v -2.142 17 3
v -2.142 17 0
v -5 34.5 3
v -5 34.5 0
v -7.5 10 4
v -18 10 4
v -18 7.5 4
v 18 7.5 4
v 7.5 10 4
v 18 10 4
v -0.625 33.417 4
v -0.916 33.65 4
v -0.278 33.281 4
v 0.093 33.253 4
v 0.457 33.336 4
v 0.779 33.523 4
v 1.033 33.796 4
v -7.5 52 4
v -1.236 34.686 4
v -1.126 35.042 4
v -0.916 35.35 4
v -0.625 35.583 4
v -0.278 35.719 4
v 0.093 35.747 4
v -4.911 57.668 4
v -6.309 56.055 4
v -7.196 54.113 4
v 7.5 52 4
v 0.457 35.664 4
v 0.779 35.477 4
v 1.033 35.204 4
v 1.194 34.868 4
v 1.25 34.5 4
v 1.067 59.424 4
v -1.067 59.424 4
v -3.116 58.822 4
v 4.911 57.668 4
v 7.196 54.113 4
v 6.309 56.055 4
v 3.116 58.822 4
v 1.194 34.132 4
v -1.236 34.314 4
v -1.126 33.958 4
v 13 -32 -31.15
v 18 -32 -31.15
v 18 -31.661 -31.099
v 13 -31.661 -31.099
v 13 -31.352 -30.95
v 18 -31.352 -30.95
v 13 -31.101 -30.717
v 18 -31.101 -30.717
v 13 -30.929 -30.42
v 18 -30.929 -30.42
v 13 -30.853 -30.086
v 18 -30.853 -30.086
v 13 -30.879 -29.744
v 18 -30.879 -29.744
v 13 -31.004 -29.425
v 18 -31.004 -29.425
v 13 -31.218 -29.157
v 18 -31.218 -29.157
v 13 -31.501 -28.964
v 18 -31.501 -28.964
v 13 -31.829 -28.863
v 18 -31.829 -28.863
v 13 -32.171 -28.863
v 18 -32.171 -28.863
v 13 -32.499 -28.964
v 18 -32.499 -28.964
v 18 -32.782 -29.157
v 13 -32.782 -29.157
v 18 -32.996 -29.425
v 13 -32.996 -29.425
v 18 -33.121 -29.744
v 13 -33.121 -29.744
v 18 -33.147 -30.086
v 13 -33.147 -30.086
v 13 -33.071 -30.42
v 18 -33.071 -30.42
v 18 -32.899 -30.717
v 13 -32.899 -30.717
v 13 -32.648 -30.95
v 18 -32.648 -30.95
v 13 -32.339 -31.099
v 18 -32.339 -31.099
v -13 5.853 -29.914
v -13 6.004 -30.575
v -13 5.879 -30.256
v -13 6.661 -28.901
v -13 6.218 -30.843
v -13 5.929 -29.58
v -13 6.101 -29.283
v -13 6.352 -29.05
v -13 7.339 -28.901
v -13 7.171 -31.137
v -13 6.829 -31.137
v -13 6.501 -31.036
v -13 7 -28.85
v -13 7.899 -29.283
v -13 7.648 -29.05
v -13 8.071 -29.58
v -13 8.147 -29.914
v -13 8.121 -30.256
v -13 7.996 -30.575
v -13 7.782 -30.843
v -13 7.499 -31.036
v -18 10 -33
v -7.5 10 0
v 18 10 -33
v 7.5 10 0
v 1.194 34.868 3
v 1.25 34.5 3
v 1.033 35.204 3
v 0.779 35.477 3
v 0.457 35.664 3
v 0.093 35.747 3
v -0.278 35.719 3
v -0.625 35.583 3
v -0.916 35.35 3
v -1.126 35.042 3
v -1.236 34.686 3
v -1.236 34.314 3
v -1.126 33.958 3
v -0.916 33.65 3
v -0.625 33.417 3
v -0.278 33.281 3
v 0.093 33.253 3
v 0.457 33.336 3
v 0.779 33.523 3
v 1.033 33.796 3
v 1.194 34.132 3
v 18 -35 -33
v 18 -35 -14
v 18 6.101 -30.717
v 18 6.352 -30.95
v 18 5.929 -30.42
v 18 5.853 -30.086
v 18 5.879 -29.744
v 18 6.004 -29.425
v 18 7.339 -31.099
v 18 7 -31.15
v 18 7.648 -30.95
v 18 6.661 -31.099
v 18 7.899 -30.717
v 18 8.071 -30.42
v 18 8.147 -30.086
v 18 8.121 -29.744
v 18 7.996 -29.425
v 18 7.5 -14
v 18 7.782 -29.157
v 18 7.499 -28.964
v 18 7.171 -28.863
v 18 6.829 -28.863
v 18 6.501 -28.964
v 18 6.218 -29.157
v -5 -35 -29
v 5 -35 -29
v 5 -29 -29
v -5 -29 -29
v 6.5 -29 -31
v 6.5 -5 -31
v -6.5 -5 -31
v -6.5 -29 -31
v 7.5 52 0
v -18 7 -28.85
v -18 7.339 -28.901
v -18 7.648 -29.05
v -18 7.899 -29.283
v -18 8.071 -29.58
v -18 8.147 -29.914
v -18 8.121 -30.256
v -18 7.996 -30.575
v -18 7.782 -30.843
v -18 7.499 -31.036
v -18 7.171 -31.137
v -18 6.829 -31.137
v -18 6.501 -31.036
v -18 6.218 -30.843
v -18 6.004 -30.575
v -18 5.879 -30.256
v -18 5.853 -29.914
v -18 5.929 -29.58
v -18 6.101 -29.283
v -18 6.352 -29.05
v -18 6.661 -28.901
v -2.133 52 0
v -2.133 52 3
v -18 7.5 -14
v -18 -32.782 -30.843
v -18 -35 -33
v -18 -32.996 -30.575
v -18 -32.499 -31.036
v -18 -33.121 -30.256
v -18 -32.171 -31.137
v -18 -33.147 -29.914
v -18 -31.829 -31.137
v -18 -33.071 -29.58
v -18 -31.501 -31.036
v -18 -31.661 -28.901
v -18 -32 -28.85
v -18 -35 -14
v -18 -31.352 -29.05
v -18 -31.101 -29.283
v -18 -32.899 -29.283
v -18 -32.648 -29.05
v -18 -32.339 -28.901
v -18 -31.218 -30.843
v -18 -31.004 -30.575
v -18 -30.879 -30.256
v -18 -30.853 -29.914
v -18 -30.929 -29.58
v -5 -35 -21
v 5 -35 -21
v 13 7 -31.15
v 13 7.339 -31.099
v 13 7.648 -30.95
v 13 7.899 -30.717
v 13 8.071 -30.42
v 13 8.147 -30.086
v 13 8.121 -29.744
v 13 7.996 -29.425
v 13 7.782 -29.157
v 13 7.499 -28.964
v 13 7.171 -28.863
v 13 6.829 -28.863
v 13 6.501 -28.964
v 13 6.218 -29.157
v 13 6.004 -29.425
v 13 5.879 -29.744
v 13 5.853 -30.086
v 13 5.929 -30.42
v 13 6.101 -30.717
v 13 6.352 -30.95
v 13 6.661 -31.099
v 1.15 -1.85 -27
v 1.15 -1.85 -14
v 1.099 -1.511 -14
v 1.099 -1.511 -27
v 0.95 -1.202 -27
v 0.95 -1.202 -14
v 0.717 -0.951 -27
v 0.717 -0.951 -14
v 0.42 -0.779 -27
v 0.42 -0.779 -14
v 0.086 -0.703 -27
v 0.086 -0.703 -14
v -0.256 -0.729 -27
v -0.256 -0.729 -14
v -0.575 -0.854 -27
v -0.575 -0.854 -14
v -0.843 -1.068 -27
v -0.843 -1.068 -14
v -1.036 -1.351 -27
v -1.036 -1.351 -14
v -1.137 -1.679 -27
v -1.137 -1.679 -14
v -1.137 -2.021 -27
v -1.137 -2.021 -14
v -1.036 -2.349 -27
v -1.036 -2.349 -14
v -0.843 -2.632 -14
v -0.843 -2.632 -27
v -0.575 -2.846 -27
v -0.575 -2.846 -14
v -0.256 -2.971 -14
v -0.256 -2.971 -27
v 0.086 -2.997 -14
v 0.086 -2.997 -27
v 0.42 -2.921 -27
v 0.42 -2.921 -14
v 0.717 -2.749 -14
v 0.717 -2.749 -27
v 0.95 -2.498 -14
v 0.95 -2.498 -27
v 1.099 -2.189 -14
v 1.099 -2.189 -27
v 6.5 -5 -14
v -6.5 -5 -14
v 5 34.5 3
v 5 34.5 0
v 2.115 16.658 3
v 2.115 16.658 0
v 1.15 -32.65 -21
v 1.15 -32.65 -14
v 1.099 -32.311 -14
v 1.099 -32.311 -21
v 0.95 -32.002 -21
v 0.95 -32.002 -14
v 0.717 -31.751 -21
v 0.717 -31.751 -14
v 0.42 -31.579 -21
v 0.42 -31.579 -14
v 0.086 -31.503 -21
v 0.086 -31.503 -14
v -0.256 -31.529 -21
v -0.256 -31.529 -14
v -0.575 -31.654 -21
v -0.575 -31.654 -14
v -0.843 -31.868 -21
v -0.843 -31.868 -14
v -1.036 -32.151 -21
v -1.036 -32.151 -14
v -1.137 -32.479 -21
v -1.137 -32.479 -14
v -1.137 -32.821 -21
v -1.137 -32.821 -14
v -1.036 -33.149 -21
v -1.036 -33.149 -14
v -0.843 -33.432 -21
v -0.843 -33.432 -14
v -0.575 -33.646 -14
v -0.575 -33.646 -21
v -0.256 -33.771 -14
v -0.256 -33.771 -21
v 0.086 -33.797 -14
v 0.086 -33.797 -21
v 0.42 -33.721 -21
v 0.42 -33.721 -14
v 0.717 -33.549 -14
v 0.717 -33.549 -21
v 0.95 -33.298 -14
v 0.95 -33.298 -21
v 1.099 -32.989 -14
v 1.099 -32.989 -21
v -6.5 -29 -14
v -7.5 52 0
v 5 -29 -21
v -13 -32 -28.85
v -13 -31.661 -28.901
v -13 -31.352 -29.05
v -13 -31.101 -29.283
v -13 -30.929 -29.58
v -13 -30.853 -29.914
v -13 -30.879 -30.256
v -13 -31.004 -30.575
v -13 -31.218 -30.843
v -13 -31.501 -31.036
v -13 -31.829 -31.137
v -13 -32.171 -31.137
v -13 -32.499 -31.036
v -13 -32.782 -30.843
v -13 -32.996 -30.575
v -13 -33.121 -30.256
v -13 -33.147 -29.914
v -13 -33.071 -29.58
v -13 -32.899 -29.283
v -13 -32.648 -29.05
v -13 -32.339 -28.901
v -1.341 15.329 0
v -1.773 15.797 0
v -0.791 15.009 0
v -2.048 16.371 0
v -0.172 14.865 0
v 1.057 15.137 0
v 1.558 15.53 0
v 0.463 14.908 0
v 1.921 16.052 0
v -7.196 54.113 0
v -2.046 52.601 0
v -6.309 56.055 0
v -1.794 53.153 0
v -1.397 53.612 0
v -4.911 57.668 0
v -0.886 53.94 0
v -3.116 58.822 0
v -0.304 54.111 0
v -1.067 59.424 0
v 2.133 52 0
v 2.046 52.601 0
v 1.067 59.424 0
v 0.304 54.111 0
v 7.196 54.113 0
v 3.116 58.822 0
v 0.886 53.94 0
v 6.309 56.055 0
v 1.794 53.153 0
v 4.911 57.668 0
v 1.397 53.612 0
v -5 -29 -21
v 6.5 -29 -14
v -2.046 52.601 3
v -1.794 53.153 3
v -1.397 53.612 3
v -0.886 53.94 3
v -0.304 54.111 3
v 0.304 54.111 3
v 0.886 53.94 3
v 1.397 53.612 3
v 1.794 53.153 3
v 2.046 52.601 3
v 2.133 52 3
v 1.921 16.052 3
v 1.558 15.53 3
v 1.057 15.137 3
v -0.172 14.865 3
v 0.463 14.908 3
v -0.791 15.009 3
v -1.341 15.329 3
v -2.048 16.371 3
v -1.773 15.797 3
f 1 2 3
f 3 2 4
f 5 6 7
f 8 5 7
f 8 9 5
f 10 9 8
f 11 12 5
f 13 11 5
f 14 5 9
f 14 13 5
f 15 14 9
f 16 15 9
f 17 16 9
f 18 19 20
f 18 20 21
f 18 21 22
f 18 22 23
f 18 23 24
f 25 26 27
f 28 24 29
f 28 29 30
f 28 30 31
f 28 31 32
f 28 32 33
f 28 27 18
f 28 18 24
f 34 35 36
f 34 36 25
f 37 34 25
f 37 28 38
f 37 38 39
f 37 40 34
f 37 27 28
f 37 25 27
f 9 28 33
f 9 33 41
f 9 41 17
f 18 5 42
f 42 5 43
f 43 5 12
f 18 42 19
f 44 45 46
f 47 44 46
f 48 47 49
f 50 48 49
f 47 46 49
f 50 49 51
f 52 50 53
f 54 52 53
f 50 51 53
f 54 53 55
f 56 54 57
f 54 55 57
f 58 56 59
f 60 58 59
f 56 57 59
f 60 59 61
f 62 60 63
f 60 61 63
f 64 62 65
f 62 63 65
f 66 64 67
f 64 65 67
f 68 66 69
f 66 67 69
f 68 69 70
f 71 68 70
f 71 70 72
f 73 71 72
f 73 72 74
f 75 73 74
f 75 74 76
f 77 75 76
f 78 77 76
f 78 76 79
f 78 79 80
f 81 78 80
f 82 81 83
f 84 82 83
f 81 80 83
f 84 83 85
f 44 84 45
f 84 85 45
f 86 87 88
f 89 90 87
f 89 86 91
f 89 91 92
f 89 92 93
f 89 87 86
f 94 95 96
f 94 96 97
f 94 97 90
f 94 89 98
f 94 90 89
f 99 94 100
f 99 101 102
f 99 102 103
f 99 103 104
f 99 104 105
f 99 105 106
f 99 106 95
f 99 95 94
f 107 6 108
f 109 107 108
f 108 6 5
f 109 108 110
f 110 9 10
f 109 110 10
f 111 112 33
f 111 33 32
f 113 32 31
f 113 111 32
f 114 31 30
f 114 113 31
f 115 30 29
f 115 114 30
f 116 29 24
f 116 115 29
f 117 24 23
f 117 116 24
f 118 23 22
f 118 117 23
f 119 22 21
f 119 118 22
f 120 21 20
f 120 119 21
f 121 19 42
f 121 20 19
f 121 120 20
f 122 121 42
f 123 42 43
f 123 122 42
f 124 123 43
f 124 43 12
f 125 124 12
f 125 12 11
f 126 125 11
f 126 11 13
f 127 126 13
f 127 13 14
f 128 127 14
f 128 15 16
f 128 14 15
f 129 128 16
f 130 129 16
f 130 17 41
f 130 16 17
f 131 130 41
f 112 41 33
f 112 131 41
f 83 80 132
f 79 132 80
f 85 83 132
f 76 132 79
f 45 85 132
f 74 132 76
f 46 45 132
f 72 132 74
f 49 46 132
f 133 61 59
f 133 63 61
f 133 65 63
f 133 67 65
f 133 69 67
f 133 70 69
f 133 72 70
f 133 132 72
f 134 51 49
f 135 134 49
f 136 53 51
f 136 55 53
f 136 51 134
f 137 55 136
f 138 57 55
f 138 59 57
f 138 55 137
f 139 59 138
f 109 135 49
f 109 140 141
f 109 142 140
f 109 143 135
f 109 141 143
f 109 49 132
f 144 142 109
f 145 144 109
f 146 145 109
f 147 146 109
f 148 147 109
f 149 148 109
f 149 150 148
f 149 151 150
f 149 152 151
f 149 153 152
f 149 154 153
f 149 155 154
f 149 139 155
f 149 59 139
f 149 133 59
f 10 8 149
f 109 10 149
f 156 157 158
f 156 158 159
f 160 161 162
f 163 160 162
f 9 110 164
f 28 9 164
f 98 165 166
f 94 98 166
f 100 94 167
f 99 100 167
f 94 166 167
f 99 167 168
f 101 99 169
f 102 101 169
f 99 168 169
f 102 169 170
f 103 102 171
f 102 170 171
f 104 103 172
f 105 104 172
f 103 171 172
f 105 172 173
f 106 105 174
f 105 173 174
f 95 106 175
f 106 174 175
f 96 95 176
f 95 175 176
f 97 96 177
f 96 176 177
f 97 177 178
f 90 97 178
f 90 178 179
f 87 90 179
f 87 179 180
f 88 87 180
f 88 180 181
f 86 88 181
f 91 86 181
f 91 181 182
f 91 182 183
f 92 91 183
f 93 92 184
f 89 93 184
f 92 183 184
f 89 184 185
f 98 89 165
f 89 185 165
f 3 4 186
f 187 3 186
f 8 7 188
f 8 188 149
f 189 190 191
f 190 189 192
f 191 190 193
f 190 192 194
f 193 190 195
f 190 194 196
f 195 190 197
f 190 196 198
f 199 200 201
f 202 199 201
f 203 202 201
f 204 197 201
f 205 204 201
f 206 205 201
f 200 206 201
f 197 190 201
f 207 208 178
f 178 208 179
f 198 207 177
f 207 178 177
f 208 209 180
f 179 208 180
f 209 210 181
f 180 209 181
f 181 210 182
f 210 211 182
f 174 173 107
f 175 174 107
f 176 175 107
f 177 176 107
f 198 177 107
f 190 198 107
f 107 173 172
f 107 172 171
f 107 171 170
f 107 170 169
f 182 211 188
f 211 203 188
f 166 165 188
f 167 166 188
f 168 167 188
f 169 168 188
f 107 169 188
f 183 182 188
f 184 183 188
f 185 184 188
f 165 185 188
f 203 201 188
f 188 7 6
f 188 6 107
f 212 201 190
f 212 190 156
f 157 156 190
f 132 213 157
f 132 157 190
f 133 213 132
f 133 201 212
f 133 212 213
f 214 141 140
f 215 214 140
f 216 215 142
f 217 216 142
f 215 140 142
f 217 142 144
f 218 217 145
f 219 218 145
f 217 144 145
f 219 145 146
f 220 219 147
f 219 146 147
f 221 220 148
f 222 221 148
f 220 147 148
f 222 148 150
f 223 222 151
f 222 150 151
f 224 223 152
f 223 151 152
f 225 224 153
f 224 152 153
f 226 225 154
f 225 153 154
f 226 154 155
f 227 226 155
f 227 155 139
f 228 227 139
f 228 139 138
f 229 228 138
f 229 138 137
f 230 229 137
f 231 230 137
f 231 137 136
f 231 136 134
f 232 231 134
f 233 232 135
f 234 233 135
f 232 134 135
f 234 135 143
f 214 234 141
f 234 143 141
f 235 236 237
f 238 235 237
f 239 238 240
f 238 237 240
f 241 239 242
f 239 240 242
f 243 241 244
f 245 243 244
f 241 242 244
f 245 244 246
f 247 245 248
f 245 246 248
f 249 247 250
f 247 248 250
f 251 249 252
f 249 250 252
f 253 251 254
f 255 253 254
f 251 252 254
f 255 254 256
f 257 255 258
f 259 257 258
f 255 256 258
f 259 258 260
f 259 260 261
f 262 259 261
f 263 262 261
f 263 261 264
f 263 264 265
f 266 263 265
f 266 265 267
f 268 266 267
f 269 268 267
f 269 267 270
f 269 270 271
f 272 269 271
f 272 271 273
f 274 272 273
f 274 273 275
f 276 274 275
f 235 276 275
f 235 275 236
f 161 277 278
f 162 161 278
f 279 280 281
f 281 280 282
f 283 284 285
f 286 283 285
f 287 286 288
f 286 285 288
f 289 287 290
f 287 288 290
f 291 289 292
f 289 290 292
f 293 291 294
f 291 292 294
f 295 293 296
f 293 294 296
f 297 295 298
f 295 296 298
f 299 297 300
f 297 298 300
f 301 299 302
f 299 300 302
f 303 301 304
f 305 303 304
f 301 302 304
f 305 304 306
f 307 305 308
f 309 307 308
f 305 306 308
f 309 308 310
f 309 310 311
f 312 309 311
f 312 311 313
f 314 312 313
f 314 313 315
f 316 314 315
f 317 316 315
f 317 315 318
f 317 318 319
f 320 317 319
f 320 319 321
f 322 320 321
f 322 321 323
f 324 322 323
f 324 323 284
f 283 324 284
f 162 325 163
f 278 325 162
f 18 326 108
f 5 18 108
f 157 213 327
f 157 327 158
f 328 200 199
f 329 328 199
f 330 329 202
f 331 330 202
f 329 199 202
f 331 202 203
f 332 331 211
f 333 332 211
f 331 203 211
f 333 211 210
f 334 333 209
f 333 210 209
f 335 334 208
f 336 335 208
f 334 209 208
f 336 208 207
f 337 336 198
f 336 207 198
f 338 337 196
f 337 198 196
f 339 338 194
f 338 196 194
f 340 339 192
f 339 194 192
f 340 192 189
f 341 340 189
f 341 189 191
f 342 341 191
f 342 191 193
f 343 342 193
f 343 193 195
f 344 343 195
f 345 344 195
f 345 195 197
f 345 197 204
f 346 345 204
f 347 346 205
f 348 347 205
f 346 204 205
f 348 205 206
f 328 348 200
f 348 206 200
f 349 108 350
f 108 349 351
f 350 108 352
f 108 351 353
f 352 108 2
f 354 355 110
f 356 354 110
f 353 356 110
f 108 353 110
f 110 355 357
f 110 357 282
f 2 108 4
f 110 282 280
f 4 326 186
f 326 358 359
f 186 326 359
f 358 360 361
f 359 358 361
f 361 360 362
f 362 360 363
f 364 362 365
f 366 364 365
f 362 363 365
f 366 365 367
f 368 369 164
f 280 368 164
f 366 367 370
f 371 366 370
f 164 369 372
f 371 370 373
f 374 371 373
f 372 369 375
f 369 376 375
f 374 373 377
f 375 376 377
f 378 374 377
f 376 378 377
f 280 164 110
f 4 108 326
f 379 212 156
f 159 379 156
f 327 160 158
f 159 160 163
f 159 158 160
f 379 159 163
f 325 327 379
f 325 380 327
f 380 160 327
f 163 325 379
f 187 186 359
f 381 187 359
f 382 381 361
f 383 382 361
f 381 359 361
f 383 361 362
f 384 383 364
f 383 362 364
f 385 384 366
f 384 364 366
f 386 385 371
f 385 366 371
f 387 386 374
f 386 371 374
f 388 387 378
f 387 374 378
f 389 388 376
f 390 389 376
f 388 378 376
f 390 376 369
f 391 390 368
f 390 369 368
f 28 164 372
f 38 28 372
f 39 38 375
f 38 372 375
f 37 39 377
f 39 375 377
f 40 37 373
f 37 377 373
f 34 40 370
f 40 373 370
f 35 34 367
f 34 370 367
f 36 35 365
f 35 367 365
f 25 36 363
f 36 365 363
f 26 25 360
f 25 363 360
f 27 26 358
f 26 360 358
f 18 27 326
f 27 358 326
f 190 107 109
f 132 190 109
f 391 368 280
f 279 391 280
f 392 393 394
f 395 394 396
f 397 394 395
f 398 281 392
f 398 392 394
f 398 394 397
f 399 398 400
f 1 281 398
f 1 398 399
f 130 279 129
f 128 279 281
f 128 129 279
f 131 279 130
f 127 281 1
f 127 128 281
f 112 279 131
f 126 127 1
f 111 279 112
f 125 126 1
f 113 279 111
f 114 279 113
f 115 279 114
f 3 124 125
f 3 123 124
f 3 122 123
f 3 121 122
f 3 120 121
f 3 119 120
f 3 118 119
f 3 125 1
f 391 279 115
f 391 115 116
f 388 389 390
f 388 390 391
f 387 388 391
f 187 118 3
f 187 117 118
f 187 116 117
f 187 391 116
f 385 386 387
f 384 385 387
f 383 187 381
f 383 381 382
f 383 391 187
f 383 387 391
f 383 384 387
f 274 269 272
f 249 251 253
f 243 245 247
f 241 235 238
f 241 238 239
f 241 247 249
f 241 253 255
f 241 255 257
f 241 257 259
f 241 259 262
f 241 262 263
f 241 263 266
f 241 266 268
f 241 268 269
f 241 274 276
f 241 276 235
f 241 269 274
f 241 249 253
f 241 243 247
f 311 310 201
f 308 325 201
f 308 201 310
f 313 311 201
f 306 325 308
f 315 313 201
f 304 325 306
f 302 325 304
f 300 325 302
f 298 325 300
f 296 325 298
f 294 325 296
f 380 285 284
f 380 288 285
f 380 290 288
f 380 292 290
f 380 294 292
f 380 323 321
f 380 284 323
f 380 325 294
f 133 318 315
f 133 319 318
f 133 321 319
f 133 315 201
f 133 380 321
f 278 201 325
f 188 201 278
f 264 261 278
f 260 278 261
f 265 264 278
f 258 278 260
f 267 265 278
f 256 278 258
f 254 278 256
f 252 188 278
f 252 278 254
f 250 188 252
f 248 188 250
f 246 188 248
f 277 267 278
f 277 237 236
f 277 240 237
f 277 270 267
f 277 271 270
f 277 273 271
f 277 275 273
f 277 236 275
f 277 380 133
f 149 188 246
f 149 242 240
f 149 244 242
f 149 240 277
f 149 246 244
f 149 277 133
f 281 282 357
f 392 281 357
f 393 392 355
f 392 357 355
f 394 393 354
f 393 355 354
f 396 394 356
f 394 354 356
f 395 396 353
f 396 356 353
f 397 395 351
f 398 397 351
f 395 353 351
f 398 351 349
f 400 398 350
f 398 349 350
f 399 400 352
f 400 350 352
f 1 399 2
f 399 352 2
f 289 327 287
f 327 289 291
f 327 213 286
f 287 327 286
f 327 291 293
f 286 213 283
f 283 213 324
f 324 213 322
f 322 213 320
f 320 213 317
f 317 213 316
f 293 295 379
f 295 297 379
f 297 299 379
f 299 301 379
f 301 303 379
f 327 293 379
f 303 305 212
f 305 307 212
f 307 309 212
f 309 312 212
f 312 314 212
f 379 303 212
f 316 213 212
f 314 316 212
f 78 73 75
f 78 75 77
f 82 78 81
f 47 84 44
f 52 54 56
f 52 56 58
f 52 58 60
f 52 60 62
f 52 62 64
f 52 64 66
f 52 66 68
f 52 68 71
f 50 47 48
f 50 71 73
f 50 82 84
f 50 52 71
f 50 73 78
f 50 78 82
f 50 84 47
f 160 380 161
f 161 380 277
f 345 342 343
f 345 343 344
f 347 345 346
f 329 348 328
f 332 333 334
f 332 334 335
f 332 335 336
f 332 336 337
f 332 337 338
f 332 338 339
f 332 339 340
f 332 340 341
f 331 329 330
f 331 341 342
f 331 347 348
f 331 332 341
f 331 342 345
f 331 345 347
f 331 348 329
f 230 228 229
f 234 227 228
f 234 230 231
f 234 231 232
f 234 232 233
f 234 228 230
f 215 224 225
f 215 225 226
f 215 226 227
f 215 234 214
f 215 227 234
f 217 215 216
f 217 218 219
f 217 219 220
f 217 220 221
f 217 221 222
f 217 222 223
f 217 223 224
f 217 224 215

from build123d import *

# Parameters (mm, degrees)
EXTRUDE_1_DEPTH     = 4
CUT_EXTRUDE_1_DEPTH = 3
SKETCH_5_R          = 1.25
CUT_EXTRUDE_2_DEPTH = 12.4
SKETCH_13_W         = 36
SKETCH_13_H         = 45
EXTRUDE_2_DEPTH     = 37
SKETCH_14_W         = 13
SKETCH_14_H         = 24
CUT_EXTRUDE_3_DEPTH = 35
SKETCH_15_R         = 1.15
CUT_EXTRUDE_4_DEPTH = 31
SKETCH_16_W         = 10
SKETCH_16_H         = 8
CUT_EXTRUDE_5_DEPTH = 8
SKETCH_17_W         = 36
SKETCH_17_H         = 42.5
CUT_EXTRUDE_6_DEPTH = 18
SKETCH_23_R         = 1.15
CUT_EXTRUDE_7_DEPTH = 5
SKETCH_24_R         = 1.15
CUT_EXTRUDE_8_DEPTH = 5


with BuildPart() as part:
    # 草圖1 → 填料-伸長1 (new body)
    with BuildSketch(Plane.XY):
        with BuildLine():
            Line((7.5, 10), (7.5, 52))
            ThreePointArc((7.5, 52), (0, 59.5), (-7.5, 52))
            Line((-7.5, 52), (-7.5, 10))
            Line((-7.5, 10), (7.5, 10))
        make_face()
    extrude(amount=EXTRUDE_1_DEPTH)

    # 草圖3 → 除料-伸長1 (cut)
    with BuildSketch(Plane.XY):
        with BuildLine():
            ThreePointArc((-2.132795501, 52), (0, 54.132795501), (2.132795501, 52))
            Line((2.132795501, 52), (5, 34.5))
            Line((5, 34.5), (2.114741289, 16.658021353))
            ThreePointArc((2.114741289, 16.658021353), (-0.171540182, 14.864665347), (-2.142213835, 17))
            Line((-2.142213835, 17), (-5, 34.5))
            Line((-5, 34.5), (-2.132795501, 52))
        make_face()
    extrude(amount=CUT_EXTRUDE_1_DEPTH, mode=Mode.SUBTRACT)

    # 草圖5 → 除料-伸長2 (cut)
    with BuildSketch(Plane.XY):
        with Locations((0, 34.5)):
            Circle(SKETCH_5_R)
    extrude(amount=CUT_EXTRUDE_2_DEPTH, mode=Mode.SUBTRACT)

    # 草圖13 → 填料-伸長2 (add)
    with BuildSketch(Plane.XY.offset(4)):
        with Locations((0, -12.5)):
            Rectangle(SKETCH_13_W, SKETCH_13_H)
    extrude(amount=-EXTRUDE_2_DEPTH)

    # 草圖14 → 除料-伸長3 (cut)
    with BuildSketch(Plane(origin=(0, 0, 4), x_dir=(-1, 0, 0), z_dir=(0, 0, -1))):
        with Locations((0, -17)):
            Rectangle(SKETCH_14_W, SKETCH_14_H)
    extrude(amount=CUT_EXTRUDE_3_DEPTH, mode=Mode.SUBTRACT)

    # 草圖15 → 除料-伸長4 (cut)
    with BuildSketch(Plane.XY.offset(4)):
        with Locations((0, -1.85)):
            Circle(SKETCH_15_R)
        with Locations((0, -32.65)):
            Circle(SKETCH_15_R)
    extrude(amount=-CUT_EXTRUDE_4_DEPTH, mode=Mode.SUBTRACT)

    # 草圖16 → 除料-伸長5 (cut)
    with BuildSketch(Plane(origin=(0, -35, 0), x_dir=(-1, 0, 0), z_dir=(0, -1, 0))):
        with Locations((0, 25)):
            Rectangle(SKETCH_16_W, SKETCH_16_H)
    extrude(amount=-CUT_EXTRUDE_5_DEPTH, mode=Mode.SUBTRACT)

    # 草圖17 → 除料-伸長6 (cut)
    with BuildSketch(Plane.XY.offset(4)):
        with Locations((0, -13.75)):
            Rectangle(SKETCH_17_W, SKETCH_17_H)
    extrude(amount=-CUT_EXTRUDE_6_DEPTH, mode=Mode.SUBTRACT)

    # 草圖23 → 除料-伸長7 (cut)
    with BuildSketch(Plane.ZY.offset(18)):
        with Locations((-30, 7)):
            Circle(SKETCH_23_R)
        with Locations((-30, -32)):
            Circle(SKETCH_23_R)
    extrude(amount=-CUT_EXTRUDE_7_DEPTH, mode=Mode.SUBTRACT)

    # 草圖24 → 除料-伸長8 (cut)
    with BuildSketch(Plane(origin=(18, 0, 0), x_dir=(0, 0, -1), z_dir=(1, 0, 0))):
        with Locations((30, 7)):
            Circle(SKETCH_24_R)
        with Locations((30, -32)):
            Circle(SKETCH_24_R)
    extrude(amount=-CUT_EXTRUDE_8_DEPTH, mode=Mode.SUBTRACT)


solid = part.part
